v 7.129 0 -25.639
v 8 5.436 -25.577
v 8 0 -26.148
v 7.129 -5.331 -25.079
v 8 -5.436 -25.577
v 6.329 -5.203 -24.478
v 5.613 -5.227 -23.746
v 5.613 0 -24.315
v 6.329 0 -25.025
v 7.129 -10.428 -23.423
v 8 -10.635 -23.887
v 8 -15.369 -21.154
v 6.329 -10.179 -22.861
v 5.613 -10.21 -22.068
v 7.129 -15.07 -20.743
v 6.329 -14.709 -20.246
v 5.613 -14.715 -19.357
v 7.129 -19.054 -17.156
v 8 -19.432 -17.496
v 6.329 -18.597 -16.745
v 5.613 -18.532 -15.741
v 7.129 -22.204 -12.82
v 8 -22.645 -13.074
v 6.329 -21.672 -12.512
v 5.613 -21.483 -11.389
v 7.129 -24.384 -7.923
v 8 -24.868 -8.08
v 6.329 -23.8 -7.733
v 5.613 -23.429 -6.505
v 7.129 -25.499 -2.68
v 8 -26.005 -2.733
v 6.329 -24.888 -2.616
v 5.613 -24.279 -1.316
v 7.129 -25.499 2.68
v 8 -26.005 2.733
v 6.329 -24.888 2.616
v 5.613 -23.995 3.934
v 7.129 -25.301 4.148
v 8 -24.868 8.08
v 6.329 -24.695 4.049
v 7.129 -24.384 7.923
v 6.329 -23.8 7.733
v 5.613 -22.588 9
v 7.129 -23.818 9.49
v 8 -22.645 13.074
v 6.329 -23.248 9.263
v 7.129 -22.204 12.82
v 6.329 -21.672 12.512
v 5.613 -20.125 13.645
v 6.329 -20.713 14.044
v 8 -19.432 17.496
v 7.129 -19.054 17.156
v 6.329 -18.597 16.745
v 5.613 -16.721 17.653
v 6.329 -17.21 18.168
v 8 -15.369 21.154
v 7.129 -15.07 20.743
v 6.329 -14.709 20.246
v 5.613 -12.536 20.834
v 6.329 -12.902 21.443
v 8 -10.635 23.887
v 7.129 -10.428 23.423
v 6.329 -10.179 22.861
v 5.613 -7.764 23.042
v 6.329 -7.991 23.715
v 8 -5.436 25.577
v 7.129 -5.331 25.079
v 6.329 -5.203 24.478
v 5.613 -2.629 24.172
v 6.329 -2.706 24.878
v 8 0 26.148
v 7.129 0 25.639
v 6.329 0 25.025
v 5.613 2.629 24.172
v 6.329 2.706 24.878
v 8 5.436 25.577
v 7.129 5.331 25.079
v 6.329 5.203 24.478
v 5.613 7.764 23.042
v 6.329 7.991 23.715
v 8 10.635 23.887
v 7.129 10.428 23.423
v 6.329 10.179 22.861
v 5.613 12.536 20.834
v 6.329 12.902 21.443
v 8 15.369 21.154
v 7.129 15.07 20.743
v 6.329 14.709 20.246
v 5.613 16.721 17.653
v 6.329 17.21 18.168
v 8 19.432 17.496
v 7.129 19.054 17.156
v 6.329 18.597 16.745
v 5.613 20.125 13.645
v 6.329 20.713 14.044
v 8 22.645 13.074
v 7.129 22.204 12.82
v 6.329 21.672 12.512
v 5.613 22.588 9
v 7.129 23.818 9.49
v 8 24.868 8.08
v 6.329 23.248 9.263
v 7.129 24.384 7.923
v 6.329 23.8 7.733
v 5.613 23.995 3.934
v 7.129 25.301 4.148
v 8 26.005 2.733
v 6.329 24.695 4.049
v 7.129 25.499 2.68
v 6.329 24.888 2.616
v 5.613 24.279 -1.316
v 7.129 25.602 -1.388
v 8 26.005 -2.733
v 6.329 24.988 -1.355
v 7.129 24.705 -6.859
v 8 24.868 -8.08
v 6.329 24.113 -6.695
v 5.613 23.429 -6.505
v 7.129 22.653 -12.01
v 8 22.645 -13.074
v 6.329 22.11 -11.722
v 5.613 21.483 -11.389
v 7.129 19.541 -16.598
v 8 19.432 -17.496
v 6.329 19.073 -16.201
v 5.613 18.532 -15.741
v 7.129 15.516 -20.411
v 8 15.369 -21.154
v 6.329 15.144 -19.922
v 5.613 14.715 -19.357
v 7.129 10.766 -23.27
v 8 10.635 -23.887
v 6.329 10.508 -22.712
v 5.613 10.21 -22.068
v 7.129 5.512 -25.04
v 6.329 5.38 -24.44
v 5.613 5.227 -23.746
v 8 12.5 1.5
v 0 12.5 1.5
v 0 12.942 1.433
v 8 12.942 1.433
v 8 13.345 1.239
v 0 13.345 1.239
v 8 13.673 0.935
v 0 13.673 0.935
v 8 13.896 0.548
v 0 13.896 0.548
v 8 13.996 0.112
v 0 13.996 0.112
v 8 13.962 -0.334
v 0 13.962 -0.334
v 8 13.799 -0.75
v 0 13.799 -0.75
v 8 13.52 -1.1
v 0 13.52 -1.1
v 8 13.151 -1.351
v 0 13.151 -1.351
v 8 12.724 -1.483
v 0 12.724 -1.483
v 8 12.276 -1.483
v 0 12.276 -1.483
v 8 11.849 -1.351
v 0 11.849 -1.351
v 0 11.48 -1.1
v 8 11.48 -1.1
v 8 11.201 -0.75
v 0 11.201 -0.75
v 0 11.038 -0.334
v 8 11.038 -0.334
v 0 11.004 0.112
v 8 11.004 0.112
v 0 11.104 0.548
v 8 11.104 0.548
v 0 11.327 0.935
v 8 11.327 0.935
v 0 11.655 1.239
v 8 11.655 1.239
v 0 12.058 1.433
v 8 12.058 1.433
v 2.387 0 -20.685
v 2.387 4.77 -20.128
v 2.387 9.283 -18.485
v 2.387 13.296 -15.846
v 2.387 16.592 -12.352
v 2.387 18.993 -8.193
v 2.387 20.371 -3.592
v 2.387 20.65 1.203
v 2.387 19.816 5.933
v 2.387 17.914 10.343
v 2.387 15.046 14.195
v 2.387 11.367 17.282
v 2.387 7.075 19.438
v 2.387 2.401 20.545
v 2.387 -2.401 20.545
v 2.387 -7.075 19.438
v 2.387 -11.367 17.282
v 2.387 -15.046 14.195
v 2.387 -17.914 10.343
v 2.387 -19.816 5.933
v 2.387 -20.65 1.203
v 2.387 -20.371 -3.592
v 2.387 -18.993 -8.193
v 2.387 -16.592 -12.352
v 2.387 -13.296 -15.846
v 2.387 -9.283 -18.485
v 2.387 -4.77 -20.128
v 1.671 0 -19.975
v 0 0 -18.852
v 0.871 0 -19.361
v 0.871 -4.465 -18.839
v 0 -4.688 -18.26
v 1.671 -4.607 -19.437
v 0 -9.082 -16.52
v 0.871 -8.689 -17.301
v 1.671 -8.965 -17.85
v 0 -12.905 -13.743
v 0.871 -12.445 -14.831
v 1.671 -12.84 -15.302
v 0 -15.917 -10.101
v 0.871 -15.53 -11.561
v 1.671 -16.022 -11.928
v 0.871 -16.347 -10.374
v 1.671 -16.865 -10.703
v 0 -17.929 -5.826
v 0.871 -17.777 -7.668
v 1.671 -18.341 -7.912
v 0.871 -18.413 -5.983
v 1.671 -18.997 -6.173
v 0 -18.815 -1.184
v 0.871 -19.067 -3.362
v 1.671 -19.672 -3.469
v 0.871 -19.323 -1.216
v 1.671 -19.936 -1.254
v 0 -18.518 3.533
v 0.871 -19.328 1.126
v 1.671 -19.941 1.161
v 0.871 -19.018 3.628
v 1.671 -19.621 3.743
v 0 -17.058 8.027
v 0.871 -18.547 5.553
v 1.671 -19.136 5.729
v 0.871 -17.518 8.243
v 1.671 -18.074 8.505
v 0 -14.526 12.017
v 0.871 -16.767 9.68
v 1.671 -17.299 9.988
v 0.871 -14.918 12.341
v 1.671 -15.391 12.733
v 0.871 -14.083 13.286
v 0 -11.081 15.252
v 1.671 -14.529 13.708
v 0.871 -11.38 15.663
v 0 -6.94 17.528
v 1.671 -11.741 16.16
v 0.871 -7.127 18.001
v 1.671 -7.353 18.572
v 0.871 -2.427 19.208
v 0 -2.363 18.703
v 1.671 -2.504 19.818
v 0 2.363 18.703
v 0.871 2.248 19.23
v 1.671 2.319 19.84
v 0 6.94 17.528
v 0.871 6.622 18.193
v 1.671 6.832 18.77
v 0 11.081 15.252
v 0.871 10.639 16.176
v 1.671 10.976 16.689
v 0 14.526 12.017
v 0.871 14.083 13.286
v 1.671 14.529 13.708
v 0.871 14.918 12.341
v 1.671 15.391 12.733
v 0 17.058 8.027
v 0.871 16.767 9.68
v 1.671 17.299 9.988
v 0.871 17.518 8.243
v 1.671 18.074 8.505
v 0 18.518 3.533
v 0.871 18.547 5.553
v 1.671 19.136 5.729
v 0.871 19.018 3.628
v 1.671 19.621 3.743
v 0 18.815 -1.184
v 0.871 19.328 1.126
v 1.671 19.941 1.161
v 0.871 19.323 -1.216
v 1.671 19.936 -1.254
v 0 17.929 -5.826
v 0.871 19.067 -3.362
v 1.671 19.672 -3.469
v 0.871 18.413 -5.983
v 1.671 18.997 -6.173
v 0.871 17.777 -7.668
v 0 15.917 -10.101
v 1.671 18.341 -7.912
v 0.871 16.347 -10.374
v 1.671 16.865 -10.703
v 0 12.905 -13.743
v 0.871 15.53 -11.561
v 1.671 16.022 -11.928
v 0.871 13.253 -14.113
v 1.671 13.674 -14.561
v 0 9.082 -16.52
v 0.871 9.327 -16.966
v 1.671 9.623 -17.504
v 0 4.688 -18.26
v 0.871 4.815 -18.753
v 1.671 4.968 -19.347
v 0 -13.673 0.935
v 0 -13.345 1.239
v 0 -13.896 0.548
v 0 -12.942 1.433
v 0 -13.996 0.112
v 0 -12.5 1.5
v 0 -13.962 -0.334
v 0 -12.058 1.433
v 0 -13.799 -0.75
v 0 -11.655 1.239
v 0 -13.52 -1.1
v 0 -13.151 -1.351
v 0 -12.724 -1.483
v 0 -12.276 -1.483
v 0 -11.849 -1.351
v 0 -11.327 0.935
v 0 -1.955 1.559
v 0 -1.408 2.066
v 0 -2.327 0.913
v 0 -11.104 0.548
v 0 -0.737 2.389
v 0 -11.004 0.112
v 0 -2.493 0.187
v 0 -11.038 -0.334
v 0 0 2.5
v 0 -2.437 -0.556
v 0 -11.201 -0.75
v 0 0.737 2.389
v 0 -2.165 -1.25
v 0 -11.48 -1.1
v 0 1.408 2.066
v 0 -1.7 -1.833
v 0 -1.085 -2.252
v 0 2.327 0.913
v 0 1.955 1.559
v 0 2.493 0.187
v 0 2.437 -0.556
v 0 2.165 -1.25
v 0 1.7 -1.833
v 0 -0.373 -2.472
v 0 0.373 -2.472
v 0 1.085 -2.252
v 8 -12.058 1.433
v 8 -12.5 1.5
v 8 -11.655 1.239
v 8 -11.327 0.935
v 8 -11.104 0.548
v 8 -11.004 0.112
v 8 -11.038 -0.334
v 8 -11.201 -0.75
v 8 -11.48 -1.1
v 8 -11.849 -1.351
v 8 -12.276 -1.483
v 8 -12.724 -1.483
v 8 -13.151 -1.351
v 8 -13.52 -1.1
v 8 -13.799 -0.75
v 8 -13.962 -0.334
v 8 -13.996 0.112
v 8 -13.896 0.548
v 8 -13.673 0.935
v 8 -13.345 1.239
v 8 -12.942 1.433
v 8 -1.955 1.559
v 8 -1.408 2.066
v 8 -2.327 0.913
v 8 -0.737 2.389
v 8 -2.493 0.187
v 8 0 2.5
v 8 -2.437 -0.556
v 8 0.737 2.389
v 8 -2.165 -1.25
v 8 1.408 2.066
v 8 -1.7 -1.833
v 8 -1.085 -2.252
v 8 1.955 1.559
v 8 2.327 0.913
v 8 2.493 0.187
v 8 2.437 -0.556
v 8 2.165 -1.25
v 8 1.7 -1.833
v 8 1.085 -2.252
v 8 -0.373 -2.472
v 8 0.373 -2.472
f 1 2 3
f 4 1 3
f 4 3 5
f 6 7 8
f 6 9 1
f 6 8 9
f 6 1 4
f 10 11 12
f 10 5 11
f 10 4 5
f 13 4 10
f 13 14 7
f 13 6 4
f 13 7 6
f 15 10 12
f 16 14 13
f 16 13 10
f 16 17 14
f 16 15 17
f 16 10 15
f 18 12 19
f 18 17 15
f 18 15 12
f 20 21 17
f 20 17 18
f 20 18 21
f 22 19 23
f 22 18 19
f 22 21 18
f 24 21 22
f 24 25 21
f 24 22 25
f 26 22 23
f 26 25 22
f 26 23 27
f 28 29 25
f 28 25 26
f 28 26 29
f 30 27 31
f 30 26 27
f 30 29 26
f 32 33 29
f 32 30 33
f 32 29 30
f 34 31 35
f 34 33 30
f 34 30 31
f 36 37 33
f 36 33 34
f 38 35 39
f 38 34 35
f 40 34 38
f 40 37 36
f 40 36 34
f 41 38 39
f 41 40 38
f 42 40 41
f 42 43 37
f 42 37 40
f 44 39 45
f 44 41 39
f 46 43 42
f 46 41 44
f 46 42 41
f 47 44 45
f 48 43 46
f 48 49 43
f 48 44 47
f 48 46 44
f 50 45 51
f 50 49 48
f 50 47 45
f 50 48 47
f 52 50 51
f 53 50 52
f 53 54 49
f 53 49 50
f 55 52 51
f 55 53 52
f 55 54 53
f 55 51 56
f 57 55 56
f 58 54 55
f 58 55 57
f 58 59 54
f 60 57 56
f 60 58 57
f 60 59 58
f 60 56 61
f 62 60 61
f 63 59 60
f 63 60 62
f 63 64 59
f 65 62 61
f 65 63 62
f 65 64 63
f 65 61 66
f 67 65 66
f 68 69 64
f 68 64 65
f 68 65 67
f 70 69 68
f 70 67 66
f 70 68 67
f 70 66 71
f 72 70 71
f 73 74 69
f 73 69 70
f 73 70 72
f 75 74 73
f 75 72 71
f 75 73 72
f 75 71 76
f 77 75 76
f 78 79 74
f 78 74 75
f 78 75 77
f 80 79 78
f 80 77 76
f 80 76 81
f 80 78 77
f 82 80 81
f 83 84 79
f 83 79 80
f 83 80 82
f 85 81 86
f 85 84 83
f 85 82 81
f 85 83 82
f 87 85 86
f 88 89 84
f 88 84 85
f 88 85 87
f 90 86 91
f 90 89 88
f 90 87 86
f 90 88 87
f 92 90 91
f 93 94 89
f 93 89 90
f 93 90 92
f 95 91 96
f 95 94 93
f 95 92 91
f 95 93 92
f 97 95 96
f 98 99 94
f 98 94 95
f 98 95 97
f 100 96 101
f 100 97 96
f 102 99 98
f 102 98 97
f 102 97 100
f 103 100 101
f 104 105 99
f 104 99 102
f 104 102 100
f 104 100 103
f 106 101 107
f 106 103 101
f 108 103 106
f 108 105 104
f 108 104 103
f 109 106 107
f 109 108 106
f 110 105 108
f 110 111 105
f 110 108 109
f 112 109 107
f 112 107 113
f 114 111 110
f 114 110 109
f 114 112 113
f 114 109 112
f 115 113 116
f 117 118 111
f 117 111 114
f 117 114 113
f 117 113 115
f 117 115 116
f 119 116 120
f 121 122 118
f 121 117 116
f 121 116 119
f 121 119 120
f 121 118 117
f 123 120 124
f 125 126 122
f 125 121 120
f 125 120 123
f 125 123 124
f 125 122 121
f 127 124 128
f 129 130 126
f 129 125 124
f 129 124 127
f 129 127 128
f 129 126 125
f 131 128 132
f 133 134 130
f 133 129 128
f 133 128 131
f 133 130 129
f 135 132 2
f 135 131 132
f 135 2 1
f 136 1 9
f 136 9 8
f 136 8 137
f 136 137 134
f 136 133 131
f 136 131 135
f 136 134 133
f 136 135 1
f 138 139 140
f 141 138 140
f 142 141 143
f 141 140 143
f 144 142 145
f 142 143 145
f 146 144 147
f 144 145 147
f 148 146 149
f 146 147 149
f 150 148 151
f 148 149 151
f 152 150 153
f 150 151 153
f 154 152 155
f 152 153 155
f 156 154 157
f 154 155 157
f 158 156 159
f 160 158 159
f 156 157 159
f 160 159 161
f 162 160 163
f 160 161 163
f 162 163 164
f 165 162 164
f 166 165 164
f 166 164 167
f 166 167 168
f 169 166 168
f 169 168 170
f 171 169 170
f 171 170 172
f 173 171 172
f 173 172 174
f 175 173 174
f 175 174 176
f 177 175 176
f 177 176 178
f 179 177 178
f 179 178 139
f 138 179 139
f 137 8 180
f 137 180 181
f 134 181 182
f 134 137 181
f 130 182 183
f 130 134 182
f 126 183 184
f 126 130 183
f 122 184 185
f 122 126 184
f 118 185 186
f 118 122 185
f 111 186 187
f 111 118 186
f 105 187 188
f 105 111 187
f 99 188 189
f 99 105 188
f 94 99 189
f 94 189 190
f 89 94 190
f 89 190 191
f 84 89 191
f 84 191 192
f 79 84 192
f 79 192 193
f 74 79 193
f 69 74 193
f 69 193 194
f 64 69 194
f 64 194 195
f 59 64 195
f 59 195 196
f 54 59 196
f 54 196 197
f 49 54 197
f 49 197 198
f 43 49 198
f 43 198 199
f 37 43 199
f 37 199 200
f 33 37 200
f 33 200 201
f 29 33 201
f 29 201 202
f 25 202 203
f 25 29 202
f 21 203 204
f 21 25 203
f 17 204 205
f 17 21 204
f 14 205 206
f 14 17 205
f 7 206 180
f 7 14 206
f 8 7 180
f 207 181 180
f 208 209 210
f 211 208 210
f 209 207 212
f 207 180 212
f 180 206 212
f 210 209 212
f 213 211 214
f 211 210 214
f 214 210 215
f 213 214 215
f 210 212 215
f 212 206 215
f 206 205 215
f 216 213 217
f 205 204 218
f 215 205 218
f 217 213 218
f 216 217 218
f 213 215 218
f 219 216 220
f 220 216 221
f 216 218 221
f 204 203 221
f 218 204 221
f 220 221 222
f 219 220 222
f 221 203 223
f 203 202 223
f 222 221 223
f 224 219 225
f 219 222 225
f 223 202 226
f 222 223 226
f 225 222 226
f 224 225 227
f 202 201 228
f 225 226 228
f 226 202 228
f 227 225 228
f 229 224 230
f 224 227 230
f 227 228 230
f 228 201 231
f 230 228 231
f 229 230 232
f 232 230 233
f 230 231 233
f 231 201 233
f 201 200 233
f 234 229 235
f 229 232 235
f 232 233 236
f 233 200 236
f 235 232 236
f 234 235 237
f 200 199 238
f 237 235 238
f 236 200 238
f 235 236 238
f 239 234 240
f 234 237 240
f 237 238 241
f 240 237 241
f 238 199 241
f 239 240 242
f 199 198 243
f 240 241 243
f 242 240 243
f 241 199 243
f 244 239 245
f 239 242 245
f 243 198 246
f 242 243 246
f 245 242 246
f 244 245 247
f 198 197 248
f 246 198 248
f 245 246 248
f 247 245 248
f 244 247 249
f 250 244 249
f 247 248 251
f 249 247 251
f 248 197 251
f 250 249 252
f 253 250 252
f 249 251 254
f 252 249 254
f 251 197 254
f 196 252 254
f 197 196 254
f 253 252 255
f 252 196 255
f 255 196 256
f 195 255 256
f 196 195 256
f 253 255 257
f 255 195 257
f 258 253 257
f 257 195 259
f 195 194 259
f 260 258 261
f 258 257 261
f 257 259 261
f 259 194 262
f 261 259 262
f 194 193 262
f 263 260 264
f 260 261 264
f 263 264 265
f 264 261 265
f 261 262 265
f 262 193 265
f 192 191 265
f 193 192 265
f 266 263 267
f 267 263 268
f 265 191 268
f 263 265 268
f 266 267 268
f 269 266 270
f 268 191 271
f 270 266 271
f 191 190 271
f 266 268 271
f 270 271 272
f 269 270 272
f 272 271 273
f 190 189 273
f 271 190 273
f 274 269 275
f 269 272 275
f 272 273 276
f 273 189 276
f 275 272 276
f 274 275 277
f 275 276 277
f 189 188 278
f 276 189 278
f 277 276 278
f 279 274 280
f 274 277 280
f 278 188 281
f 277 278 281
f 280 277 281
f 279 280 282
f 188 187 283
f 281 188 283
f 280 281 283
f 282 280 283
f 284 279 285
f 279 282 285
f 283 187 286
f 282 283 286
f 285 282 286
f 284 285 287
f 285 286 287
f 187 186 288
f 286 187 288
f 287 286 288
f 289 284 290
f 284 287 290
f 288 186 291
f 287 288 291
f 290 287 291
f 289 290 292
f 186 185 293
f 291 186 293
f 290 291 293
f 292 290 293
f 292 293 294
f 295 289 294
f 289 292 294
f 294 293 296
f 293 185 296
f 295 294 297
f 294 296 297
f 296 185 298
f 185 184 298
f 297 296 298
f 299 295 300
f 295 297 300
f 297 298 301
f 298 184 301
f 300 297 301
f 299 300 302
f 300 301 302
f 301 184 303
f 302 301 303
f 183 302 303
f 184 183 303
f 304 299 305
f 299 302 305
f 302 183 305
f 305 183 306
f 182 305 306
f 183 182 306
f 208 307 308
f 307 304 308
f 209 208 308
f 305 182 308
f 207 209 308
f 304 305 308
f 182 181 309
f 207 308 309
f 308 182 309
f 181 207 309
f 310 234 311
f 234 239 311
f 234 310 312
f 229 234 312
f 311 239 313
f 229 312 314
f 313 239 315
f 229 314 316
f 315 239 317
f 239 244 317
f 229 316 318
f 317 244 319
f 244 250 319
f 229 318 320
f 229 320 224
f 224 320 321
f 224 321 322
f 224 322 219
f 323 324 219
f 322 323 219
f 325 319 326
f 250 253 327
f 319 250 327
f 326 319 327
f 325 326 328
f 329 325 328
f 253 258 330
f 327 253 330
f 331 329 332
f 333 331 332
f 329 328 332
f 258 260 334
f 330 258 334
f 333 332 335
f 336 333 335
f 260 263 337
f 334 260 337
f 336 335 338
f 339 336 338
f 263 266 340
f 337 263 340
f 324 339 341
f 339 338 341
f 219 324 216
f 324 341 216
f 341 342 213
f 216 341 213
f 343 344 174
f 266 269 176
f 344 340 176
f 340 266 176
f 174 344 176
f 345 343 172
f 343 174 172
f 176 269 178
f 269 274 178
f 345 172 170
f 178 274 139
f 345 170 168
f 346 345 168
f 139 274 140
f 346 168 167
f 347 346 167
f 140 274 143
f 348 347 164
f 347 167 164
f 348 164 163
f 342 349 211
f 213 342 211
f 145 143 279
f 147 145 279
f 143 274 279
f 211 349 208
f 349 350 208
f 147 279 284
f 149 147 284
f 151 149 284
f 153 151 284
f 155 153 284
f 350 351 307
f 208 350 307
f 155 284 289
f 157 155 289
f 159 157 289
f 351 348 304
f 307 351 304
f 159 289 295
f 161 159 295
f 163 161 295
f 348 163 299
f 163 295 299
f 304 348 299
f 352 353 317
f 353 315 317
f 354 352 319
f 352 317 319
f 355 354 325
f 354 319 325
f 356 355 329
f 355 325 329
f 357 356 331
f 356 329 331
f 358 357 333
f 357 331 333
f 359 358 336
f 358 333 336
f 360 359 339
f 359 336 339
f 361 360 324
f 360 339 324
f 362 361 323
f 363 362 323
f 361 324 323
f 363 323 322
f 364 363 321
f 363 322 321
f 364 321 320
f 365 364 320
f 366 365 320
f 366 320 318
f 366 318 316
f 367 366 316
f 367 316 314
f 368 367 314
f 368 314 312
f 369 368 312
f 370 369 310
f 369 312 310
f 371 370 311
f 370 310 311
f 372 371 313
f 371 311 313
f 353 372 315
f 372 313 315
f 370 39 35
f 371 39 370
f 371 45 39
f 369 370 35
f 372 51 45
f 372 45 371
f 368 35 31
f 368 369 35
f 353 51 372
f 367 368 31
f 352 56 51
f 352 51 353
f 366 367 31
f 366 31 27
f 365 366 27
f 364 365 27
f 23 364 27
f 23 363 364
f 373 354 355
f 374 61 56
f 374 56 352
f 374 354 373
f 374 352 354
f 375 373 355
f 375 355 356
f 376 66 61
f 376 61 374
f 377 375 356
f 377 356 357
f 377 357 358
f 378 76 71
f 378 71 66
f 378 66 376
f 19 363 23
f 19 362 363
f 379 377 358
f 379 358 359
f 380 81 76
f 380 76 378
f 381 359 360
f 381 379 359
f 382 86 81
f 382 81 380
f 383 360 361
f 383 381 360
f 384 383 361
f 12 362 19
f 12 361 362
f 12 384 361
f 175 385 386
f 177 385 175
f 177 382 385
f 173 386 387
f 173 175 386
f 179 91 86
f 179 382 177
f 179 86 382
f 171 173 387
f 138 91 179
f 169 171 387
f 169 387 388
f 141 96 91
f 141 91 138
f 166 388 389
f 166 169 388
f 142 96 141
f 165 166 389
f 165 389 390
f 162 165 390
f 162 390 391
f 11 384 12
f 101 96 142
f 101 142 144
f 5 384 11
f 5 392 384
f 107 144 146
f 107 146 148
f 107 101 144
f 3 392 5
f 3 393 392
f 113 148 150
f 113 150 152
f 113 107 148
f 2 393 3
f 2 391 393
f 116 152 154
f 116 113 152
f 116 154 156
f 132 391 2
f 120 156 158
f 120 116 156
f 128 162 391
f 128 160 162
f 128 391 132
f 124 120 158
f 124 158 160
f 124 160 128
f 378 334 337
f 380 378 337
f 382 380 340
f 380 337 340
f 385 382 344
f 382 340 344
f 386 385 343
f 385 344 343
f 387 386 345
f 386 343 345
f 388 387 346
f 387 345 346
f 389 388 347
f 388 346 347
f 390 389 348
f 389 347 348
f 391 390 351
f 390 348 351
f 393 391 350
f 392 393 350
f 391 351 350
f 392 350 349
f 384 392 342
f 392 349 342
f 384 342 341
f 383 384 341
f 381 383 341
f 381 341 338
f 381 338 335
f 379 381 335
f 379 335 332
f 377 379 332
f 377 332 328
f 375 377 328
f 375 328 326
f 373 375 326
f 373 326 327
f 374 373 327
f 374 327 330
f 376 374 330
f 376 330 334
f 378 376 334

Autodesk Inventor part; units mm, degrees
ref_plane "YZ Plane" through (0, 0, 0) normal (1, 0, 0) x (0, 1, 0)
ref_plane "XZ Plane" through (0, 0, 0) normal (0, 1, 0) x (-1, 0, 0)
ref_plane "XY Plane" through (0, 0, 0) normal (0, 0, 1) x (1, 0, 0)
sketch "Sketch1" plane through (0, 0, 0) normal (0, 1, 0) x (-1, 0, 0)
  line L0 (0, 0) -> (0, -18) construction
  line L1 (0, 0) -> (-8, 0)
  line L2 (-8, 0) -> (-8, -27) construction
  line L3 (-2.3867, -20.6851) -> (-5.6133, -24.3149)
  arc A0 (0, -18.852) -> (-2.3867, -20.6851) centre (3.5925, -26) ccw
  arc A1 (-8, -26.148) -> (-5.6133, -24.3149) centre (-11.5925, -19) ccw
  line L4 (0, 0) -> (0, -18.852)
  line L5 (-8, 0) -> (-8, -26.148)
  dimension "d0" = 18
  dimension "d1" = 8
  dimension "d2" = 27
  dimension "d3" = 8
revolve "Revolution1" add sketch "Sketch1" angle 360 about axis through (0, 0, 0) along (1, 0, 0)
sketch "Sketch2" plane through (0, 0, 0) normal (-1, 0, 0) x (0, 0, 1)
  circle A0 centre (0, 0) radius 2.5
  line L0 (0, 0) -> (0, 12.5) construction
  circle A1 centre (0, 12.5) radius 1.5
  line L1 (0, 0) -> (0, -12.5) construction
  circle A2 centre (0, -12.5) radius 1.5
  dimension "d5" = 5
  dimension "d6" = 12.5
  dimension "d7" = 12.5
  dimension "d8" = 3
  dimension "d9" = 3
extrude "Extrusion1" cut sketch "Sketch2" against normal blind 10
properties part number "gearboxmotorconnection"
